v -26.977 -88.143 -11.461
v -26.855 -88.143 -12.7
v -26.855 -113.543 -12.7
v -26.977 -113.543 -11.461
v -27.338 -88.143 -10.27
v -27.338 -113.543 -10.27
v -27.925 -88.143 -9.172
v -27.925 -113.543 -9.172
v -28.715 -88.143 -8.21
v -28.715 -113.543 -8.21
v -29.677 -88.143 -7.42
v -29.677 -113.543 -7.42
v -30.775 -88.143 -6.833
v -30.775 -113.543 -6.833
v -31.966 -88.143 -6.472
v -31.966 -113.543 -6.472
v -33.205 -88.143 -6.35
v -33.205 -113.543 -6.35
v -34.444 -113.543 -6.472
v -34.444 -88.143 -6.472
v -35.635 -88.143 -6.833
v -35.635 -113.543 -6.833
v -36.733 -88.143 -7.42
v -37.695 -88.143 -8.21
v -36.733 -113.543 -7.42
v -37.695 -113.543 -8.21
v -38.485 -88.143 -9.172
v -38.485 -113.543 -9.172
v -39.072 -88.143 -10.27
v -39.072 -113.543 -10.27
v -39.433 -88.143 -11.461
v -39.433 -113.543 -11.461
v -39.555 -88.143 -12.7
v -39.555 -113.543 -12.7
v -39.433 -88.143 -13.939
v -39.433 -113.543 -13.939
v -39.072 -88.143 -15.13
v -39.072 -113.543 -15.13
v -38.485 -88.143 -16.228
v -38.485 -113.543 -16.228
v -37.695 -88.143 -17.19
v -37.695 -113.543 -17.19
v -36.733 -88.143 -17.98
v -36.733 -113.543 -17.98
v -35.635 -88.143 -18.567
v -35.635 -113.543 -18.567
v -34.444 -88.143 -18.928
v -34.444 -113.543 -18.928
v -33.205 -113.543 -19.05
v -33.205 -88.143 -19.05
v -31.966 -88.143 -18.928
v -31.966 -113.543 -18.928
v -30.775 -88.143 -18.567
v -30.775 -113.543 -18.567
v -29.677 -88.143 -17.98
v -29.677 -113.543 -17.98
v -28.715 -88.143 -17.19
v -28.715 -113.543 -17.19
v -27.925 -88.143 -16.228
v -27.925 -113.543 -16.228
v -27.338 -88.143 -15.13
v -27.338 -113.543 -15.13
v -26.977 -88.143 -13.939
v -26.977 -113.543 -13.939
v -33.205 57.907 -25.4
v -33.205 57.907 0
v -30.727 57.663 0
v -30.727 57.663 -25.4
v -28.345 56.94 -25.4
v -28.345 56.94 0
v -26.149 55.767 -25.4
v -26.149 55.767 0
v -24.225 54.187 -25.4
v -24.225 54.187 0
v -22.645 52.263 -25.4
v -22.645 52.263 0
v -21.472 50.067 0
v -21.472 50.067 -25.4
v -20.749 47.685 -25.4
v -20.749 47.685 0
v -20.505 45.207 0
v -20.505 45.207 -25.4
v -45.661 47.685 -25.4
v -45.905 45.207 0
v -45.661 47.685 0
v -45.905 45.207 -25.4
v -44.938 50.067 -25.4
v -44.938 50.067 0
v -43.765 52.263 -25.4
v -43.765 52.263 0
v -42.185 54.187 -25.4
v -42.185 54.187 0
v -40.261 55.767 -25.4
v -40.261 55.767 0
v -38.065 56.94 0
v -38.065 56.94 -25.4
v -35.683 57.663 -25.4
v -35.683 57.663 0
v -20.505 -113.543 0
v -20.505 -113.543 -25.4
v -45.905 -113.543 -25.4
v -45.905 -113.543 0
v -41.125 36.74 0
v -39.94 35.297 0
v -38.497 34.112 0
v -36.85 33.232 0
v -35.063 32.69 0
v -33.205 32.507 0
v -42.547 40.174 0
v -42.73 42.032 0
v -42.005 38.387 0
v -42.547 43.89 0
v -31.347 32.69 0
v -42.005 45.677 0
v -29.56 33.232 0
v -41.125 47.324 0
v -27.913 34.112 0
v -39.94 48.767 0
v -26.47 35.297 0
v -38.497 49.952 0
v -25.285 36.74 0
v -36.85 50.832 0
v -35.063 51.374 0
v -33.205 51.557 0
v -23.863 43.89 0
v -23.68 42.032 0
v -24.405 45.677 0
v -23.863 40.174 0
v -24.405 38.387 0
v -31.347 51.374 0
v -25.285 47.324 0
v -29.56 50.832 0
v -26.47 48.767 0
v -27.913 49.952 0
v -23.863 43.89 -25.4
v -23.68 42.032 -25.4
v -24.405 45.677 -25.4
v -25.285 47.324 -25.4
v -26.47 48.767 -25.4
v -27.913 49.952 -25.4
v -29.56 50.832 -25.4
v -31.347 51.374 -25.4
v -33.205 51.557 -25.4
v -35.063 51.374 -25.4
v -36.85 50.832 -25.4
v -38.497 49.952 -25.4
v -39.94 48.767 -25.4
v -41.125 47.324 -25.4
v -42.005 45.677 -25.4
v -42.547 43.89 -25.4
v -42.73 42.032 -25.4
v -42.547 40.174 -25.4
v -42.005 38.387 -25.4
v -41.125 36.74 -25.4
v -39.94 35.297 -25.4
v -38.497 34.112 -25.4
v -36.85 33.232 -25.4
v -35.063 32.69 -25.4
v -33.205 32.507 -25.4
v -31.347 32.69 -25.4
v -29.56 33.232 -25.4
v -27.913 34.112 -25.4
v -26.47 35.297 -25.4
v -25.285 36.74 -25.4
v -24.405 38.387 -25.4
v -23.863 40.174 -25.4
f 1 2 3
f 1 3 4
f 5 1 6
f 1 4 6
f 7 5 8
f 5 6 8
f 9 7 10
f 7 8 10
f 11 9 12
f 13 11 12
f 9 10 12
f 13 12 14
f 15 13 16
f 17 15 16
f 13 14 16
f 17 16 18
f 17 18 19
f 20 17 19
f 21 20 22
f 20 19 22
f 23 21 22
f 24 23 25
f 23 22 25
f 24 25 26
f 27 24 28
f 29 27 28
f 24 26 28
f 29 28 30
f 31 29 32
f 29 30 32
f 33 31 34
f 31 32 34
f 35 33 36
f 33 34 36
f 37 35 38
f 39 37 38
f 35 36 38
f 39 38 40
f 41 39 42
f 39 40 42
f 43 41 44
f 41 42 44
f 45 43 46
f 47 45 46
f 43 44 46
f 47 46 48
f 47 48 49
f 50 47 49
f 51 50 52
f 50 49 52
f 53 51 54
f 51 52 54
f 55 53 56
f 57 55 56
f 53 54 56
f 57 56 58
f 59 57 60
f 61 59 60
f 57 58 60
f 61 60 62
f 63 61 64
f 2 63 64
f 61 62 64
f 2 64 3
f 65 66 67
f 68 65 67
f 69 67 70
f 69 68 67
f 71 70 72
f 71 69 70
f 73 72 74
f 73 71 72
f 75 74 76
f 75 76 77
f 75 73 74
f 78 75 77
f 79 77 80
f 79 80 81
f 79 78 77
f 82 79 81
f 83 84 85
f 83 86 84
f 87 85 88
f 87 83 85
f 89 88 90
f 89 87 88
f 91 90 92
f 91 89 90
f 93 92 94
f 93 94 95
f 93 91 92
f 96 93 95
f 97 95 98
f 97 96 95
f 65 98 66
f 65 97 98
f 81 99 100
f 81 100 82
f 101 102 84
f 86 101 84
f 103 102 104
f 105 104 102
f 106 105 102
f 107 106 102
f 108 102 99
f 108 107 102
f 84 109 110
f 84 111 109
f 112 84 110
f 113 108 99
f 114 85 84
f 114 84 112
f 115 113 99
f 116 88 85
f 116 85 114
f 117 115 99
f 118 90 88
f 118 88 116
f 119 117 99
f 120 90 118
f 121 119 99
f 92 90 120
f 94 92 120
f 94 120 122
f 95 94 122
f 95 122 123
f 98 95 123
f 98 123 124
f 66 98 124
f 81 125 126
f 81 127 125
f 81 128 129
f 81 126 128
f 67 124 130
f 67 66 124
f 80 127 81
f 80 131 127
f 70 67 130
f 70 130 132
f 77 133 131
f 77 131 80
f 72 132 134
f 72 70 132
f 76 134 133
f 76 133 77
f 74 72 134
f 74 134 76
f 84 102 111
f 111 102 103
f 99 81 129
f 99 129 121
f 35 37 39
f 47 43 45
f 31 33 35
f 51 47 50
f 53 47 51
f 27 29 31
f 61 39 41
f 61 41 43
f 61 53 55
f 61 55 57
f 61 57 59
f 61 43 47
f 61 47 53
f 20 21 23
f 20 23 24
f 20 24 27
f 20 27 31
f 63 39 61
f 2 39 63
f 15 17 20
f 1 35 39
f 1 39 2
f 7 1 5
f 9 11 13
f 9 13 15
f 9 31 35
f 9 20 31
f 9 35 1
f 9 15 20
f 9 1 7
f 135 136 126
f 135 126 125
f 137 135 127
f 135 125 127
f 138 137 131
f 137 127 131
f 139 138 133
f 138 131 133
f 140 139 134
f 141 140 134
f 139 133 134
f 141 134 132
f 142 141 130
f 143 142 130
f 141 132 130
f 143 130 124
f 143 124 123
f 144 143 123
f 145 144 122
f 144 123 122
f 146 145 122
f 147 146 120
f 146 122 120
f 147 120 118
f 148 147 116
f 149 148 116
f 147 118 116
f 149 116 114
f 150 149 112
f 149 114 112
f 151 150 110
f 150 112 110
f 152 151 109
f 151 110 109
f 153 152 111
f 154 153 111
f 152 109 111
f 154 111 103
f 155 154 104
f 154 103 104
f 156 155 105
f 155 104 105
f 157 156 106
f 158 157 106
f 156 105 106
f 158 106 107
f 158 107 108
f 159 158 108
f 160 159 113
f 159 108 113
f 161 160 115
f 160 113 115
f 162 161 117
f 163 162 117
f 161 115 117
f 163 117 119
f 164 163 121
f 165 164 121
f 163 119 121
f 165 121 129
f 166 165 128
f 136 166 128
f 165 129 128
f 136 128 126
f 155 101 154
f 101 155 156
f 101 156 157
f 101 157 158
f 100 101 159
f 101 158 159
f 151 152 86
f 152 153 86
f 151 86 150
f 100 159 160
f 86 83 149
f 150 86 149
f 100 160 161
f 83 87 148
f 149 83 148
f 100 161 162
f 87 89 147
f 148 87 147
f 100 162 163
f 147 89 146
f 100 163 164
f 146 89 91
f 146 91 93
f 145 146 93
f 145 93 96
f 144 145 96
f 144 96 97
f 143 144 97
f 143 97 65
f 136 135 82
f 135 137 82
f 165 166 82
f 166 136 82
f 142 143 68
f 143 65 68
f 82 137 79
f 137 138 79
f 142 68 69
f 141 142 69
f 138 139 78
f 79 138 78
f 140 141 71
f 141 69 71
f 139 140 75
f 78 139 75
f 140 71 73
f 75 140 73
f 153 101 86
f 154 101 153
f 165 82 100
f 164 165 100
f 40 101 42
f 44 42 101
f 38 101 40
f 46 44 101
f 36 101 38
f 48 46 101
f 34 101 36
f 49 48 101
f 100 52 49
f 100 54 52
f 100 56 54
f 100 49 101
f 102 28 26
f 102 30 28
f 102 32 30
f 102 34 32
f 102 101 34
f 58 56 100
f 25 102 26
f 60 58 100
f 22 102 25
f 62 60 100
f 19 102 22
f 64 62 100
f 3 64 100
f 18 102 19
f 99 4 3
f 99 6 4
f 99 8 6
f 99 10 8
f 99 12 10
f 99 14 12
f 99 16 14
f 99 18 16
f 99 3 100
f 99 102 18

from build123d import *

# Parameters (mm, degrees)
F0_W     = 25.4
F0_H     = 171.45
F0_R     = 9.525
F1_DEPTH = 25.4
F2_R     = 12.69999
F3_R     = 6.35
F4_DEPTH = 25.4


# Not quite as in the source:
# - a fillet or chamfer is up to 0.001 mm smaller than in the source, because OpenCascade refuses the exact size


with BuildPart() as f1:
    # F0 (on Top) → F1 (new body)
    with BuildSketch(Plane.XY):
        with Locations((-33.2050182253, -27.8180489531)):
            Rectangle(F0_W, F0_H)
        with Locations((-33.2050182253, 42.0319510469)):
            Circle(F0_R, mode=Mode.SUBTRACT)
    extrude(amount=-F1_DEPTH)

    # F2 (radius 12.7 in the source; OpenCascade refuses exactly that, so slightly less here)
    f2_edges = [f1.edges().sort_by_distance(p)[0] for p in [
        (-45.905018, 57.906951, -12.7),
        (-20.505018, 57.906951, -12.7),
    ]]
    fillet(f2_edges, radius=F2_R)

    # F3 (on face) → F4 (cut)
    with BuildSketch(Plane.XZ.offset(113.5430489531)):
        with Locations((-33.2050182253, -12.7)):
            Circle(F3_R)
    extrude(amount=-F4_DEPTH, mode=Mode.SUBTRACT)


solid = f1.part
